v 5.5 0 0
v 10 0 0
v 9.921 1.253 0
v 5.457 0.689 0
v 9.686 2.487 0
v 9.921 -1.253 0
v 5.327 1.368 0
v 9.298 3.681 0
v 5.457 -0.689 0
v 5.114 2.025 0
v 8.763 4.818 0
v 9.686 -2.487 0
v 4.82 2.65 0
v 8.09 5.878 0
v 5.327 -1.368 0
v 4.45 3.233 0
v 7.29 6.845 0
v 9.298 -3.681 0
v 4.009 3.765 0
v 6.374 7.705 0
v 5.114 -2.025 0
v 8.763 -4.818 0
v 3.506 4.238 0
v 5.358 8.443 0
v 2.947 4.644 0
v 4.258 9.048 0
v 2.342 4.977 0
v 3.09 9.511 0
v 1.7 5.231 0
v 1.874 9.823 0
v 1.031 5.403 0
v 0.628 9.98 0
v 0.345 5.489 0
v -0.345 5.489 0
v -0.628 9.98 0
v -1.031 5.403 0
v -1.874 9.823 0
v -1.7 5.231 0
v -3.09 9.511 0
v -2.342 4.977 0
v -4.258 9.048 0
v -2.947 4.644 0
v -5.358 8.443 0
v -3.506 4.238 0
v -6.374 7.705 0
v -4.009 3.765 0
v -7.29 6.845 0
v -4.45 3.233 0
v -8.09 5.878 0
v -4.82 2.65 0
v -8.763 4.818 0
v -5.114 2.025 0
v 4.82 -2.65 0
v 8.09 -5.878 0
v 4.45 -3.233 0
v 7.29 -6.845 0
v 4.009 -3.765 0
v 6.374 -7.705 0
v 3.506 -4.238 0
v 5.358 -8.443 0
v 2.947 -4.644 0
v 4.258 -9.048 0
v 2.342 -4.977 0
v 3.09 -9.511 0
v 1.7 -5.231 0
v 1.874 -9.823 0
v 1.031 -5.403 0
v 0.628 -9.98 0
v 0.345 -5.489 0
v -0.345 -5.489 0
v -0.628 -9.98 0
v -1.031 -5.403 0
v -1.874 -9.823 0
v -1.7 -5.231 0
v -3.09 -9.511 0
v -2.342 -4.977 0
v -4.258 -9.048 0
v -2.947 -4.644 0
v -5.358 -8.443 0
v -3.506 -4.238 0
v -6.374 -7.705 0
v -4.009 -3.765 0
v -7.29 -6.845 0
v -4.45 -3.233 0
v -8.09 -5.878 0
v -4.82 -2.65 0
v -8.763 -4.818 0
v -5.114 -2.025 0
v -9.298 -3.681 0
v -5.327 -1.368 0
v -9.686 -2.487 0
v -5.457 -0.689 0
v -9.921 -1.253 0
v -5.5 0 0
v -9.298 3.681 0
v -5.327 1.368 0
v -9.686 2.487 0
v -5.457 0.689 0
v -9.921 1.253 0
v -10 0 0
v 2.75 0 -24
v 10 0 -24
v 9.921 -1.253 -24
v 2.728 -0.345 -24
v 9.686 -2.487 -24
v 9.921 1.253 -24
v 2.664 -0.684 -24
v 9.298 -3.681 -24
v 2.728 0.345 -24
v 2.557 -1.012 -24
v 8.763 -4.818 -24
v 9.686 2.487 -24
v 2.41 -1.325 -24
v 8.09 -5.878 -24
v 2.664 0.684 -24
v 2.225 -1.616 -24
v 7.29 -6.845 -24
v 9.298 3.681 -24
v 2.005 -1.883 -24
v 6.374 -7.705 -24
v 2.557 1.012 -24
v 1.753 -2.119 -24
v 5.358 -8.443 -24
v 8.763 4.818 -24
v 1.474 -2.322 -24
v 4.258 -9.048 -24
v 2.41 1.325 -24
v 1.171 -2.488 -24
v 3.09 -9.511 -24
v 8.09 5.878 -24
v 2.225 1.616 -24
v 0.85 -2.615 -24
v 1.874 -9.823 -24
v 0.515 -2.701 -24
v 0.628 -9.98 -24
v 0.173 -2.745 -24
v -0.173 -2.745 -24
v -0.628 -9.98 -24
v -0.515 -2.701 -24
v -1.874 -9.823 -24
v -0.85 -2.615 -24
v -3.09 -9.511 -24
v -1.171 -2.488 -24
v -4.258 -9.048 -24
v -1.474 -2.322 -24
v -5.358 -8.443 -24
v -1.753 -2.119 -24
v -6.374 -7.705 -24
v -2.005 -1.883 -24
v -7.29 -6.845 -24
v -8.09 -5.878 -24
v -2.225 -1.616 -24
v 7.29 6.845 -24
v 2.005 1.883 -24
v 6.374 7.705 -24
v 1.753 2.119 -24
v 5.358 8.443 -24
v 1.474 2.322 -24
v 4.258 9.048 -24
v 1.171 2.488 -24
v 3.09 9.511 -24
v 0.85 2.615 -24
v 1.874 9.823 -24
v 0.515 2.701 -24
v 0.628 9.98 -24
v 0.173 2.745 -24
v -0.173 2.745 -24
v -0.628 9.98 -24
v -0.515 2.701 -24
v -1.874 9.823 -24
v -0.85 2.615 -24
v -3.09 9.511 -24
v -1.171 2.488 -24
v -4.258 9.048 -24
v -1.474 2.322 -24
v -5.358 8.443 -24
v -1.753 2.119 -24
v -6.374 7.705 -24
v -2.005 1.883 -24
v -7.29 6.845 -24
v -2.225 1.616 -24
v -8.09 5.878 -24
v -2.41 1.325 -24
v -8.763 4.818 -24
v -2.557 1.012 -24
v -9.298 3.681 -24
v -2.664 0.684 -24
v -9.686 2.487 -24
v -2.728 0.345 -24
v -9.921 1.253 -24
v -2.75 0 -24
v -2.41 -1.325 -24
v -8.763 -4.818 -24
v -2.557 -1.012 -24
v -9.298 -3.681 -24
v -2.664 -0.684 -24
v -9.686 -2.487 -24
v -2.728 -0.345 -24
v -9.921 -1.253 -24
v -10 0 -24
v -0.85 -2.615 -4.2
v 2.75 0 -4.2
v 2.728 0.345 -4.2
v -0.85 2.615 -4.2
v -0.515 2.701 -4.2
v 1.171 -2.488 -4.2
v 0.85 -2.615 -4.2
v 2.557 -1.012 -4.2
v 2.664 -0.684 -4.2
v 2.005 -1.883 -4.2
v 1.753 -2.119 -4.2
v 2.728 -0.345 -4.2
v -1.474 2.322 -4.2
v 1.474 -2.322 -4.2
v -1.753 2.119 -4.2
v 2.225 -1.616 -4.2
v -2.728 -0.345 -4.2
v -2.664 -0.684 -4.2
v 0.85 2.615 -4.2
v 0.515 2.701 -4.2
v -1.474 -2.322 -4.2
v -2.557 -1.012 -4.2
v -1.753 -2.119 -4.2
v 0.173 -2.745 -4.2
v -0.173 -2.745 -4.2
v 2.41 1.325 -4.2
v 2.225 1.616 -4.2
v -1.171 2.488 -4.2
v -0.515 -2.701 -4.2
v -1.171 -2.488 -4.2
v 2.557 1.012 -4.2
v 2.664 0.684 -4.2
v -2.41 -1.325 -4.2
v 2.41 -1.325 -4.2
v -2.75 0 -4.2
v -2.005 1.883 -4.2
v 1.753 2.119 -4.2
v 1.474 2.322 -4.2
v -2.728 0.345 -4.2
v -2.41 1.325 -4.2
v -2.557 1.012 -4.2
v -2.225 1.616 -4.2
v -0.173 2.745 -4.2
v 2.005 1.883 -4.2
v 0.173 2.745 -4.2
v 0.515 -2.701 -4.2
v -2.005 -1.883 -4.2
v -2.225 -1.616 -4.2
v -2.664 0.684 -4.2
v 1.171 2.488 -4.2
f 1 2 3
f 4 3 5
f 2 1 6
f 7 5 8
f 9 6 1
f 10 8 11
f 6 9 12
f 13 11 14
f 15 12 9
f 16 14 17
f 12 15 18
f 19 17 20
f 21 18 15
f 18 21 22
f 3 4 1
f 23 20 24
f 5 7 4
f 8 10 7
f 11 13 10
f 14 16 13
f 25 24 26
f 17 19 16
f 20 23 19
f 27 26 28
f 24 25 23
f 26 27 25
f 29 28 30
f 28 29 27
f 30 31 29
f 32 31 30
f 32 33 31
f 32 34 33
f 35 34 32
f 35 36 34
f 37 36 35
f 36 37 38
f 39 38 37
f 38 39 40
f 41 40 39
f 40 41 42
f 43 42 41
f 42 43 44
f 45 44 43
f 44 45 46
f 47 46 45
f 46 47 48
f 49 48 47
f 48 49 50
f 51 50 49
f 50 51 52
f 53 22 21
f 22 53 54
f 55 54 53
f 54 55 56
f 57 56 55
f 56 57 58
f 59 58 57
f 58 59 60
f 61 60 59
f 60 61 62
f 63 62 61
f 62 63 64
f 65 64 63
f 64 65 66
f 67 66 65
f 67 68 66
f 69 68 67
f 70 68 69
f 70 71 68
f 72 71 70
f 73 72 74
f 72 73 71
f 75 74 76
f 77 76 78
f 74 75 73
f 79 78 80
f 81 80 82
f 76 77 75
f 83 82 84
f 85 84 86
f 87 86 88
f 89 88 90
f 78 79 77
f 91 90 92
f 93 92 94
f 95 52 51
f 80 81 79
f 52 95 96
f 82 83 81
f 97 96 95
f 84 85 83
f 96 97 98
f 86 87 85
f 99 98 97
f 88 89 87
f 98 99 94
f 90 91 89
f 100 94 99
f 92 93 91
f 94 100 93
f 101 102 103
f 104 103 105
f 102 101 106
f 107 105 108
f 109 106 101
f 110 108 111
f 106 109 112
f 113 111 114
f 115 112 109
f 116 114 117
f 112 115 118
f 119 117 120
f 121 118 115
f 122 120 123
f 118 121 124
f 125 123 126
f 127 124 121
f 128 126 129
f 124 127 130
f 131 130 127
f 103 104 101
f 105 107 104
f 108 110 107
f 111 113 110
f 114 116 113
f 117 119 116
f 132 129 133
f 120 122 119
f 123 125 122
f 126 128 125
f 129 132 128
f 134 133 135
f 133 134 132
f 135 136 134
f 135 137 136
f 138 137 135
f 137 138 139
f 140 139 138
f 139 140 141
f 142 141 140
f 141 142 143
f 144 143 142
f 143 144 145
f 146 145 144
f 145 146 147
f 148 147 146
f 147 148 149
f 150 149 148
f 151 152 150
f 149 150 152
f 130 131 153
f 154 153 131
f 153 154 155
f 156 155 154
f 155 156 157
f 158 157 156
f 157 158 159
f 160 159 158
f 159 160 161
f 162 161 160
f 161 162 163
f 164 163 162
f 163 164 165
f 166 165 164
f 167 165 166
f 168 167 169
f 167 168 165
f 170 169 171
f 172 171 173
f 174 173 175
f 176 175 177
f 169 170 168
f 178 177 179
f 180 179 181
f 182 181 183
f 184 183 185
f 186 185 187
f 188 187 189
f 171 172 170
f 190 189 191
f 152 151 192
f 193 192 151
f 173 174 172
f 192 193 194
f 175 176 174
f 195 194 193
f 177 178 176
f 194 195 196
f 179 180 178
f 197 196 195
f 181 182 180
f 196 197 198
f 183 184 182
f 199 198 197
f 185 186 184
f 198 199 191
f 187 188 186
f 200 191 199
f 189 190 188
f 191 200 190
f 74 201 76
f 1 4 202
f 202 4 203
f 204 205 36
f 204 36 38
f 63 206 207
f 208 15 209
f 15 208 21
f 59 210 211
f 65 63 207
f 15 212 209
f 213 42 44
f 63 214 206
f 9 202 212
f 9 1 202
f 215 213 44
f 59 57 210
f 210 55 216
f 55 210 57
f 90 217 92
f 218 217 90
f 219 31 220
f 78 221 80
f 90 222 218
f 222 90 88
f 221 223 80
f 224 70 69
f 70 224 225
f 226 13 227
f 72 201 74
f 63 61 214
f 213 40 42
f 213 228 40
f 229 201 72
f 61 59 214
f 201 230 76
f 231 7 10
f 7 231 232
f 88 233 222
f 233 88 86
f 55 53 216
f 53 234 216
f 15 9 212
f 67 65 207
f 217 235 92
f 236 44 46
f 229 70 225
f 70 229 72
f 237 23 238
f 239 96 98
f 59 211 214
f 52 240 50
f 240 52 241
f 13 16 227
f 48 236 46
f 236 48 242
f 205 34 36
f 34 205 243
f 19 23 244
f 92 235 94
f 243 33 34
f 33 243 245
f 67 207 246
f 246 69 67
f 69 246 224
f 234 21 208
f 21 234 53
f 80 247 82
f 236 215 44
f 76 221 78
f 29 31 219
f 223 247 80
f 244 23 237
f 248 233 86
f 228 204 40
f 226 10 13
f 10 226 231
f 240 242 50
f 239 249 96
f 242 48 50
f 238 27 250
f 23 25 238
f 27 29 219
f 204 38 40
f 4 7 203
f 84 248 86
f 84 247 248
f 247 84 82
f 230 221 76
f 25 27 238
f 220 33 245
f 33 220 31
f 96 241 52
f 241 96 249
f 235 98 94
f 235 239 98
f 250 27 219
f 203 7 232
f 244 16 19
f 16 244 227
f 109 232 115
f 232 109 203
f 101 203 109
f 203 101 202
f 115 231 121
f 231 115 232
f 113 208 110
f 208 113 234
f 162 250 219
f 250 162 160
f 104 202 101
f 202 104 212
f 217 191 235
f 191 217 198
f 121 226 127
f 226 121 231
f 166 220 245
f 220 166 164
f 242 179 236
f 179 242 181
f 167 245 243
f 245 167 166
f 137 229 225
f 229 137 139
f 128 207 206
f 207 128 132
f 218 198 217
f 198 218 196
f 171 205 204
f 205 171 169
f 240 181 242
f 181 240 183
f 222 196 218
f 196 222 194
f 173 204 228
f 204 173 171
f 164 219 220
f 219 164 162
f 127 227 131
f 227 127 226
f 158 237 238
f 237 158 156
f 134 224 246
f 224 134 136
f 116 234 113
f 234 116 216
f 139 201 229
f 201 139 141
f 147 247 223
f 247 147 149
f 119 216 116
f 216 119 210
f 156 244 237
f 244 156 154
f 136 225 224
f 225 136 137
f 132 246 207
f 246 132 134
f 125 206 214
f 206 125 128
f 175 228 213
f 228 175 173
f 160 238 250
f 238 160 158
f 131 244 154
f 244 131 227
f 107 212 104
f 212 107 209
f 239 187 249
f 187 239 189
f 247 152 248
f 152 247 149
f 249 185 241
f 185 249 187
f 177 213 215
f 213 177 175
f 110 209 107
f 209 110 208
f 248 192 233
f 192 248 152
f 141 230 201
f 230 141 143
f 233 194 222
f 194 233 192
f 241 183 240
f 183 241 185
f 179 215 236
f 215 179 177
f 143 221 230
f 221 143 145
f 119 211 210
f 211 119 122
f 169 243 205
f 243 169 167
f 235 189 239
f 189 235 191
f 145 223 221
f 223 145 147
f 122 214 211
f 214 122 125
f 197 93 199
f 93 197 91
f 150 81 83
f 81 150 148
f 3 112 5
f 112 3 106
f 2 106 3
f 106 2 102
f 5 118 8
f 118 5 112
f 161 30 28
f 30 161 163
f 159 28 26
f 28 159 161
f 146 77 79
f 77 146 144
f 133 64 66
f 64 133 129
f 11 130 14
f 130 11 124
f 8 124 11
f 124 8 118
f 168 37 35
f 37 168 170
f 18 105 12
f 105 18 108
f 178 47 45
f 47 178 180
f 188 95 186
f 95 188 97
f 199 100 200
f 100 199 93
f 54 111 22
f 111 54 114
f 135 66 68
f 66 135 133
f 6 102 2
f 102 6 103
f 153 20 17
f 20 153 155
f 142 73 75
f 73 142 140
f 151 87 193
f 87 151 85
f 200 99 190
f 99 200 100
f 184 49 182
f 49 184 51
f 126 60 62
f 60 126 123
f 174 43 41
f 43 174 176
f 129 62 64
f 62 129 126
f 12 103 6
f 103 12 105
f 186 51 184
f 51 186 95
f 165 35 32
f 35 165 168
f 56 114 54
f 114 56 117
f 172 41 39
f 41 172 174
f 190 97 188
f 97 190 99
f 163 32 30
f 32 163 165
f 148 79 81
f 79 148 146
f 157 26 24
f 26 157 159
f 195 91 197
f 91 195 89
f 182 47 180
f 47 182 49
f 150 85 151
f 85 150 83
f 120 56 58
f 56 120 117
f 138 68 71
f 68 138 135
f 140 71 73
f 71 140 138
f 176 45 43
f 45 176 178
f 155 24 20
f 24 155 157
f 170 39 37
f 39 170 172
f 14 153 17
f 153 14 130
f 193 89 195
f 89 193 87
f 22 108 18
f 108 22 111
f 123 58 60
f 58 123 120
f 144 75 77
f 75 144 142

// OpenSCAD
$fn = 50;


difference() {
	union() {
		translate(v = [0, 0, -24.0000000000]) {
			cylinder(h = 24, r = 10.0000000000);
		}
		cylinder(h = 0, r = 20.0000000000);
	}
	union() {
		translate(v = [0, 0, 0]) {
			rotate(a = [0, 0, 0]) {
				difference() {
					union() {
						#translate(v = [0, 0, -24.0000000000]) {
							cylinder(h = 24, r = 2.2500000000);
						}
						#translate(v = [0, 0, -4.2000000000]) {
							cylinder(h = 4.2000000000, r = 10.0000000000, r1 = 2.7500000000, r2 = 5.5000000000);
						}
						#translate(v = [0, 0, -24.0000000000]) {
							cylinder(h = 24, r = 2.7500000000);
						}
						#translate(v = [0, 0, -24.0000000000]) {
							cylinder(h = 24, r = 2.2500000000);
						}
					}
					union();
				}
			}
		}
	}
}
